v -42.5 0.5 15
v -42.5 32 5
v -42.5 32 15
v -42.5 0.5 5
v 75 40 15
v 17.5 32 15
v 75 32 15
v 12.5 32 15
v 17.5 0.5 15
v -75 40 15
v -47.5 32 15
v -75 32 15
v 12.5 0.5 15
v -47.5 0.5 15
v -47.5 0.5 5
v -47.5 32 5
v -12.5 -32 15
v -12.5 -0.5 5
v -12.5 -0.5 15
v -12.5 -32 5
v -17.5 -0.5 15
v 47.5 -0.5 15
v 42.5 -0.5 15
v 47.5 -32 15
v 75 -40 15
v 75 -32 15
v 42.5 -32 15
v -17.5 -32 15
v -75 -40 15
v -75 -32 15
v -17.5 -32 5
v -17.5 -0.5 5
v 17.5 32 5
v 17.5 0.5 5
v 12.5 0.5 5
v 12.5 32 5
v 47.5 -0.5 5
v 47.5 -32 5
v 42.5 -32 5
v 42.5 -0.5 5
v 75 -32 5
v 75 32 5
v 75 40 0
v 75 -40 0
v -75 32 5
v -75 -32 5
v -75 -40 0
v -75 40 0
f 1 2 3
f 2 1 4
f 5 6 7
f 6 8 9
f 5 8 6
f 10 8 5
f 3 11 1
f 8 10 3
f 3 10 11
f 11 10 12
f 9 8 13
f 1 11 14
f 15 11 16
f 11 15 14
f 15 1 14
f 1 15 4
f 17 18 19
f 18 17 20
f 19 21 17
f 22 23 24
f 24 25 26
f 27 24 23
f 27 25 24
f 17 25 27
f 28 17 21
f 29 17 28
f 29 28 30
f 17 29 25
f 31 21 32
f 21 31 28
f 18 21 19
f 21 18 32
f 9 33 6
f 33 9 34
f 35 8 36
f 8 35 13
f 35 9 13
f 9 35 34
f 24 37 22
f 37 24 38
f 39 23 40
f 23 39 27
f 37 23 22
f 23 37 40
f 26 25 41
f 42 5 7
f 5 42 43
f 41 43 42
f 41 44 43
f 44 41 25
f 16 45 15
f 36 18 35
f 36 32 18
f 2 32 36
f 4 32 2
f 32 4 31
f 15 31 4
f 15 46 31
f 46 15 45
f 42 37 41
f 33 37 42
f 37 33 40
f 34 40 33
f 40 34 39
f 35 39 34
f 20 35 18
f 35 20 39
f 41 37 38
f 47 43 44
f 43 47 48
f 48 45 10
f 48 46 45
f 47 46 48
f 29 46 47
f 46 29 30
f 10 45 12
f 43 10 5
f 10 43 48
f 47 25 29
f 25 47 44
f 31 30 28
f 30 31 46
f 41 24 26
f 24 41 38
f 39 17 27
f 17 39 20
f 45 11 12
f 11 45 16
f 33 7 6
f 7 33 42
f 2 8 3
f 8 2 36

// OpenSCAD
$fn = 32;

// ----------------------------------------------------------------------
// Rib frame 150 x 80 x 15
// 4 ribs at 30 mm pitch, staggered
// ----------------------------------------------------------------------

// --- parameters (mm) ---
frame = [150, 80, 5];  // base plate size (x, y, z)
rail_w = 8;            // side rail width
ribs = 4;              // number of ribs
rib_t = 5;             // rib thickness
rib_h = 10;            // rib height above the base plate
pitch = 30;            // pitch between rib centres

// --- derived feature positions (mm) ---
span = (ribs - 1) * pitch;          // = 90   distance between the outer ribs
origin_x = -span / 2;               // = -45   X of the first rib
rib_len = frame[1] / 2 - rail_w + 0.5;  // = 32.5   length of a staggered rib
rib_y = 0.5 + rib_len / 2;          // = 16.75   Y of a staggered rib centre
row_offset = 2 * rib_y;             // = 33.5   distance between the two rows
feature_centers = [
  [origin_x + 0 * pitch, rib_y],
  [origin_x + 1 * pitch, -rib_y],
  [origin_x + 2 * pitch, rib_y],
  [origin_x + 3 * pitch, -rib_y]
];   // rib centre line, drives the rib loop

// base plate, two side rails, then the ribs read straight off feature_centers
union() {
  translate([-frame[0] / 2, -frame[1] / 2, 0]) cube(frame);
  translate([-frame[0] / 2, -frame[1] / 2, 0]) cube([frame[0], rail_w, frame[2] + rib_h]);
  translate([-frame[0] / 2, frame[1] / 2 - rail_w, 0]) cube([frame[0], rail_w, frame[2] + rib_h]);
  for (centre = feature_centers)
    translate([centre[0] - rib_t / 2, centre[1] - rib_len / 2, frame[2] - 1])
      cube([rib_t, rib_len, rib_h + 1]);
}
